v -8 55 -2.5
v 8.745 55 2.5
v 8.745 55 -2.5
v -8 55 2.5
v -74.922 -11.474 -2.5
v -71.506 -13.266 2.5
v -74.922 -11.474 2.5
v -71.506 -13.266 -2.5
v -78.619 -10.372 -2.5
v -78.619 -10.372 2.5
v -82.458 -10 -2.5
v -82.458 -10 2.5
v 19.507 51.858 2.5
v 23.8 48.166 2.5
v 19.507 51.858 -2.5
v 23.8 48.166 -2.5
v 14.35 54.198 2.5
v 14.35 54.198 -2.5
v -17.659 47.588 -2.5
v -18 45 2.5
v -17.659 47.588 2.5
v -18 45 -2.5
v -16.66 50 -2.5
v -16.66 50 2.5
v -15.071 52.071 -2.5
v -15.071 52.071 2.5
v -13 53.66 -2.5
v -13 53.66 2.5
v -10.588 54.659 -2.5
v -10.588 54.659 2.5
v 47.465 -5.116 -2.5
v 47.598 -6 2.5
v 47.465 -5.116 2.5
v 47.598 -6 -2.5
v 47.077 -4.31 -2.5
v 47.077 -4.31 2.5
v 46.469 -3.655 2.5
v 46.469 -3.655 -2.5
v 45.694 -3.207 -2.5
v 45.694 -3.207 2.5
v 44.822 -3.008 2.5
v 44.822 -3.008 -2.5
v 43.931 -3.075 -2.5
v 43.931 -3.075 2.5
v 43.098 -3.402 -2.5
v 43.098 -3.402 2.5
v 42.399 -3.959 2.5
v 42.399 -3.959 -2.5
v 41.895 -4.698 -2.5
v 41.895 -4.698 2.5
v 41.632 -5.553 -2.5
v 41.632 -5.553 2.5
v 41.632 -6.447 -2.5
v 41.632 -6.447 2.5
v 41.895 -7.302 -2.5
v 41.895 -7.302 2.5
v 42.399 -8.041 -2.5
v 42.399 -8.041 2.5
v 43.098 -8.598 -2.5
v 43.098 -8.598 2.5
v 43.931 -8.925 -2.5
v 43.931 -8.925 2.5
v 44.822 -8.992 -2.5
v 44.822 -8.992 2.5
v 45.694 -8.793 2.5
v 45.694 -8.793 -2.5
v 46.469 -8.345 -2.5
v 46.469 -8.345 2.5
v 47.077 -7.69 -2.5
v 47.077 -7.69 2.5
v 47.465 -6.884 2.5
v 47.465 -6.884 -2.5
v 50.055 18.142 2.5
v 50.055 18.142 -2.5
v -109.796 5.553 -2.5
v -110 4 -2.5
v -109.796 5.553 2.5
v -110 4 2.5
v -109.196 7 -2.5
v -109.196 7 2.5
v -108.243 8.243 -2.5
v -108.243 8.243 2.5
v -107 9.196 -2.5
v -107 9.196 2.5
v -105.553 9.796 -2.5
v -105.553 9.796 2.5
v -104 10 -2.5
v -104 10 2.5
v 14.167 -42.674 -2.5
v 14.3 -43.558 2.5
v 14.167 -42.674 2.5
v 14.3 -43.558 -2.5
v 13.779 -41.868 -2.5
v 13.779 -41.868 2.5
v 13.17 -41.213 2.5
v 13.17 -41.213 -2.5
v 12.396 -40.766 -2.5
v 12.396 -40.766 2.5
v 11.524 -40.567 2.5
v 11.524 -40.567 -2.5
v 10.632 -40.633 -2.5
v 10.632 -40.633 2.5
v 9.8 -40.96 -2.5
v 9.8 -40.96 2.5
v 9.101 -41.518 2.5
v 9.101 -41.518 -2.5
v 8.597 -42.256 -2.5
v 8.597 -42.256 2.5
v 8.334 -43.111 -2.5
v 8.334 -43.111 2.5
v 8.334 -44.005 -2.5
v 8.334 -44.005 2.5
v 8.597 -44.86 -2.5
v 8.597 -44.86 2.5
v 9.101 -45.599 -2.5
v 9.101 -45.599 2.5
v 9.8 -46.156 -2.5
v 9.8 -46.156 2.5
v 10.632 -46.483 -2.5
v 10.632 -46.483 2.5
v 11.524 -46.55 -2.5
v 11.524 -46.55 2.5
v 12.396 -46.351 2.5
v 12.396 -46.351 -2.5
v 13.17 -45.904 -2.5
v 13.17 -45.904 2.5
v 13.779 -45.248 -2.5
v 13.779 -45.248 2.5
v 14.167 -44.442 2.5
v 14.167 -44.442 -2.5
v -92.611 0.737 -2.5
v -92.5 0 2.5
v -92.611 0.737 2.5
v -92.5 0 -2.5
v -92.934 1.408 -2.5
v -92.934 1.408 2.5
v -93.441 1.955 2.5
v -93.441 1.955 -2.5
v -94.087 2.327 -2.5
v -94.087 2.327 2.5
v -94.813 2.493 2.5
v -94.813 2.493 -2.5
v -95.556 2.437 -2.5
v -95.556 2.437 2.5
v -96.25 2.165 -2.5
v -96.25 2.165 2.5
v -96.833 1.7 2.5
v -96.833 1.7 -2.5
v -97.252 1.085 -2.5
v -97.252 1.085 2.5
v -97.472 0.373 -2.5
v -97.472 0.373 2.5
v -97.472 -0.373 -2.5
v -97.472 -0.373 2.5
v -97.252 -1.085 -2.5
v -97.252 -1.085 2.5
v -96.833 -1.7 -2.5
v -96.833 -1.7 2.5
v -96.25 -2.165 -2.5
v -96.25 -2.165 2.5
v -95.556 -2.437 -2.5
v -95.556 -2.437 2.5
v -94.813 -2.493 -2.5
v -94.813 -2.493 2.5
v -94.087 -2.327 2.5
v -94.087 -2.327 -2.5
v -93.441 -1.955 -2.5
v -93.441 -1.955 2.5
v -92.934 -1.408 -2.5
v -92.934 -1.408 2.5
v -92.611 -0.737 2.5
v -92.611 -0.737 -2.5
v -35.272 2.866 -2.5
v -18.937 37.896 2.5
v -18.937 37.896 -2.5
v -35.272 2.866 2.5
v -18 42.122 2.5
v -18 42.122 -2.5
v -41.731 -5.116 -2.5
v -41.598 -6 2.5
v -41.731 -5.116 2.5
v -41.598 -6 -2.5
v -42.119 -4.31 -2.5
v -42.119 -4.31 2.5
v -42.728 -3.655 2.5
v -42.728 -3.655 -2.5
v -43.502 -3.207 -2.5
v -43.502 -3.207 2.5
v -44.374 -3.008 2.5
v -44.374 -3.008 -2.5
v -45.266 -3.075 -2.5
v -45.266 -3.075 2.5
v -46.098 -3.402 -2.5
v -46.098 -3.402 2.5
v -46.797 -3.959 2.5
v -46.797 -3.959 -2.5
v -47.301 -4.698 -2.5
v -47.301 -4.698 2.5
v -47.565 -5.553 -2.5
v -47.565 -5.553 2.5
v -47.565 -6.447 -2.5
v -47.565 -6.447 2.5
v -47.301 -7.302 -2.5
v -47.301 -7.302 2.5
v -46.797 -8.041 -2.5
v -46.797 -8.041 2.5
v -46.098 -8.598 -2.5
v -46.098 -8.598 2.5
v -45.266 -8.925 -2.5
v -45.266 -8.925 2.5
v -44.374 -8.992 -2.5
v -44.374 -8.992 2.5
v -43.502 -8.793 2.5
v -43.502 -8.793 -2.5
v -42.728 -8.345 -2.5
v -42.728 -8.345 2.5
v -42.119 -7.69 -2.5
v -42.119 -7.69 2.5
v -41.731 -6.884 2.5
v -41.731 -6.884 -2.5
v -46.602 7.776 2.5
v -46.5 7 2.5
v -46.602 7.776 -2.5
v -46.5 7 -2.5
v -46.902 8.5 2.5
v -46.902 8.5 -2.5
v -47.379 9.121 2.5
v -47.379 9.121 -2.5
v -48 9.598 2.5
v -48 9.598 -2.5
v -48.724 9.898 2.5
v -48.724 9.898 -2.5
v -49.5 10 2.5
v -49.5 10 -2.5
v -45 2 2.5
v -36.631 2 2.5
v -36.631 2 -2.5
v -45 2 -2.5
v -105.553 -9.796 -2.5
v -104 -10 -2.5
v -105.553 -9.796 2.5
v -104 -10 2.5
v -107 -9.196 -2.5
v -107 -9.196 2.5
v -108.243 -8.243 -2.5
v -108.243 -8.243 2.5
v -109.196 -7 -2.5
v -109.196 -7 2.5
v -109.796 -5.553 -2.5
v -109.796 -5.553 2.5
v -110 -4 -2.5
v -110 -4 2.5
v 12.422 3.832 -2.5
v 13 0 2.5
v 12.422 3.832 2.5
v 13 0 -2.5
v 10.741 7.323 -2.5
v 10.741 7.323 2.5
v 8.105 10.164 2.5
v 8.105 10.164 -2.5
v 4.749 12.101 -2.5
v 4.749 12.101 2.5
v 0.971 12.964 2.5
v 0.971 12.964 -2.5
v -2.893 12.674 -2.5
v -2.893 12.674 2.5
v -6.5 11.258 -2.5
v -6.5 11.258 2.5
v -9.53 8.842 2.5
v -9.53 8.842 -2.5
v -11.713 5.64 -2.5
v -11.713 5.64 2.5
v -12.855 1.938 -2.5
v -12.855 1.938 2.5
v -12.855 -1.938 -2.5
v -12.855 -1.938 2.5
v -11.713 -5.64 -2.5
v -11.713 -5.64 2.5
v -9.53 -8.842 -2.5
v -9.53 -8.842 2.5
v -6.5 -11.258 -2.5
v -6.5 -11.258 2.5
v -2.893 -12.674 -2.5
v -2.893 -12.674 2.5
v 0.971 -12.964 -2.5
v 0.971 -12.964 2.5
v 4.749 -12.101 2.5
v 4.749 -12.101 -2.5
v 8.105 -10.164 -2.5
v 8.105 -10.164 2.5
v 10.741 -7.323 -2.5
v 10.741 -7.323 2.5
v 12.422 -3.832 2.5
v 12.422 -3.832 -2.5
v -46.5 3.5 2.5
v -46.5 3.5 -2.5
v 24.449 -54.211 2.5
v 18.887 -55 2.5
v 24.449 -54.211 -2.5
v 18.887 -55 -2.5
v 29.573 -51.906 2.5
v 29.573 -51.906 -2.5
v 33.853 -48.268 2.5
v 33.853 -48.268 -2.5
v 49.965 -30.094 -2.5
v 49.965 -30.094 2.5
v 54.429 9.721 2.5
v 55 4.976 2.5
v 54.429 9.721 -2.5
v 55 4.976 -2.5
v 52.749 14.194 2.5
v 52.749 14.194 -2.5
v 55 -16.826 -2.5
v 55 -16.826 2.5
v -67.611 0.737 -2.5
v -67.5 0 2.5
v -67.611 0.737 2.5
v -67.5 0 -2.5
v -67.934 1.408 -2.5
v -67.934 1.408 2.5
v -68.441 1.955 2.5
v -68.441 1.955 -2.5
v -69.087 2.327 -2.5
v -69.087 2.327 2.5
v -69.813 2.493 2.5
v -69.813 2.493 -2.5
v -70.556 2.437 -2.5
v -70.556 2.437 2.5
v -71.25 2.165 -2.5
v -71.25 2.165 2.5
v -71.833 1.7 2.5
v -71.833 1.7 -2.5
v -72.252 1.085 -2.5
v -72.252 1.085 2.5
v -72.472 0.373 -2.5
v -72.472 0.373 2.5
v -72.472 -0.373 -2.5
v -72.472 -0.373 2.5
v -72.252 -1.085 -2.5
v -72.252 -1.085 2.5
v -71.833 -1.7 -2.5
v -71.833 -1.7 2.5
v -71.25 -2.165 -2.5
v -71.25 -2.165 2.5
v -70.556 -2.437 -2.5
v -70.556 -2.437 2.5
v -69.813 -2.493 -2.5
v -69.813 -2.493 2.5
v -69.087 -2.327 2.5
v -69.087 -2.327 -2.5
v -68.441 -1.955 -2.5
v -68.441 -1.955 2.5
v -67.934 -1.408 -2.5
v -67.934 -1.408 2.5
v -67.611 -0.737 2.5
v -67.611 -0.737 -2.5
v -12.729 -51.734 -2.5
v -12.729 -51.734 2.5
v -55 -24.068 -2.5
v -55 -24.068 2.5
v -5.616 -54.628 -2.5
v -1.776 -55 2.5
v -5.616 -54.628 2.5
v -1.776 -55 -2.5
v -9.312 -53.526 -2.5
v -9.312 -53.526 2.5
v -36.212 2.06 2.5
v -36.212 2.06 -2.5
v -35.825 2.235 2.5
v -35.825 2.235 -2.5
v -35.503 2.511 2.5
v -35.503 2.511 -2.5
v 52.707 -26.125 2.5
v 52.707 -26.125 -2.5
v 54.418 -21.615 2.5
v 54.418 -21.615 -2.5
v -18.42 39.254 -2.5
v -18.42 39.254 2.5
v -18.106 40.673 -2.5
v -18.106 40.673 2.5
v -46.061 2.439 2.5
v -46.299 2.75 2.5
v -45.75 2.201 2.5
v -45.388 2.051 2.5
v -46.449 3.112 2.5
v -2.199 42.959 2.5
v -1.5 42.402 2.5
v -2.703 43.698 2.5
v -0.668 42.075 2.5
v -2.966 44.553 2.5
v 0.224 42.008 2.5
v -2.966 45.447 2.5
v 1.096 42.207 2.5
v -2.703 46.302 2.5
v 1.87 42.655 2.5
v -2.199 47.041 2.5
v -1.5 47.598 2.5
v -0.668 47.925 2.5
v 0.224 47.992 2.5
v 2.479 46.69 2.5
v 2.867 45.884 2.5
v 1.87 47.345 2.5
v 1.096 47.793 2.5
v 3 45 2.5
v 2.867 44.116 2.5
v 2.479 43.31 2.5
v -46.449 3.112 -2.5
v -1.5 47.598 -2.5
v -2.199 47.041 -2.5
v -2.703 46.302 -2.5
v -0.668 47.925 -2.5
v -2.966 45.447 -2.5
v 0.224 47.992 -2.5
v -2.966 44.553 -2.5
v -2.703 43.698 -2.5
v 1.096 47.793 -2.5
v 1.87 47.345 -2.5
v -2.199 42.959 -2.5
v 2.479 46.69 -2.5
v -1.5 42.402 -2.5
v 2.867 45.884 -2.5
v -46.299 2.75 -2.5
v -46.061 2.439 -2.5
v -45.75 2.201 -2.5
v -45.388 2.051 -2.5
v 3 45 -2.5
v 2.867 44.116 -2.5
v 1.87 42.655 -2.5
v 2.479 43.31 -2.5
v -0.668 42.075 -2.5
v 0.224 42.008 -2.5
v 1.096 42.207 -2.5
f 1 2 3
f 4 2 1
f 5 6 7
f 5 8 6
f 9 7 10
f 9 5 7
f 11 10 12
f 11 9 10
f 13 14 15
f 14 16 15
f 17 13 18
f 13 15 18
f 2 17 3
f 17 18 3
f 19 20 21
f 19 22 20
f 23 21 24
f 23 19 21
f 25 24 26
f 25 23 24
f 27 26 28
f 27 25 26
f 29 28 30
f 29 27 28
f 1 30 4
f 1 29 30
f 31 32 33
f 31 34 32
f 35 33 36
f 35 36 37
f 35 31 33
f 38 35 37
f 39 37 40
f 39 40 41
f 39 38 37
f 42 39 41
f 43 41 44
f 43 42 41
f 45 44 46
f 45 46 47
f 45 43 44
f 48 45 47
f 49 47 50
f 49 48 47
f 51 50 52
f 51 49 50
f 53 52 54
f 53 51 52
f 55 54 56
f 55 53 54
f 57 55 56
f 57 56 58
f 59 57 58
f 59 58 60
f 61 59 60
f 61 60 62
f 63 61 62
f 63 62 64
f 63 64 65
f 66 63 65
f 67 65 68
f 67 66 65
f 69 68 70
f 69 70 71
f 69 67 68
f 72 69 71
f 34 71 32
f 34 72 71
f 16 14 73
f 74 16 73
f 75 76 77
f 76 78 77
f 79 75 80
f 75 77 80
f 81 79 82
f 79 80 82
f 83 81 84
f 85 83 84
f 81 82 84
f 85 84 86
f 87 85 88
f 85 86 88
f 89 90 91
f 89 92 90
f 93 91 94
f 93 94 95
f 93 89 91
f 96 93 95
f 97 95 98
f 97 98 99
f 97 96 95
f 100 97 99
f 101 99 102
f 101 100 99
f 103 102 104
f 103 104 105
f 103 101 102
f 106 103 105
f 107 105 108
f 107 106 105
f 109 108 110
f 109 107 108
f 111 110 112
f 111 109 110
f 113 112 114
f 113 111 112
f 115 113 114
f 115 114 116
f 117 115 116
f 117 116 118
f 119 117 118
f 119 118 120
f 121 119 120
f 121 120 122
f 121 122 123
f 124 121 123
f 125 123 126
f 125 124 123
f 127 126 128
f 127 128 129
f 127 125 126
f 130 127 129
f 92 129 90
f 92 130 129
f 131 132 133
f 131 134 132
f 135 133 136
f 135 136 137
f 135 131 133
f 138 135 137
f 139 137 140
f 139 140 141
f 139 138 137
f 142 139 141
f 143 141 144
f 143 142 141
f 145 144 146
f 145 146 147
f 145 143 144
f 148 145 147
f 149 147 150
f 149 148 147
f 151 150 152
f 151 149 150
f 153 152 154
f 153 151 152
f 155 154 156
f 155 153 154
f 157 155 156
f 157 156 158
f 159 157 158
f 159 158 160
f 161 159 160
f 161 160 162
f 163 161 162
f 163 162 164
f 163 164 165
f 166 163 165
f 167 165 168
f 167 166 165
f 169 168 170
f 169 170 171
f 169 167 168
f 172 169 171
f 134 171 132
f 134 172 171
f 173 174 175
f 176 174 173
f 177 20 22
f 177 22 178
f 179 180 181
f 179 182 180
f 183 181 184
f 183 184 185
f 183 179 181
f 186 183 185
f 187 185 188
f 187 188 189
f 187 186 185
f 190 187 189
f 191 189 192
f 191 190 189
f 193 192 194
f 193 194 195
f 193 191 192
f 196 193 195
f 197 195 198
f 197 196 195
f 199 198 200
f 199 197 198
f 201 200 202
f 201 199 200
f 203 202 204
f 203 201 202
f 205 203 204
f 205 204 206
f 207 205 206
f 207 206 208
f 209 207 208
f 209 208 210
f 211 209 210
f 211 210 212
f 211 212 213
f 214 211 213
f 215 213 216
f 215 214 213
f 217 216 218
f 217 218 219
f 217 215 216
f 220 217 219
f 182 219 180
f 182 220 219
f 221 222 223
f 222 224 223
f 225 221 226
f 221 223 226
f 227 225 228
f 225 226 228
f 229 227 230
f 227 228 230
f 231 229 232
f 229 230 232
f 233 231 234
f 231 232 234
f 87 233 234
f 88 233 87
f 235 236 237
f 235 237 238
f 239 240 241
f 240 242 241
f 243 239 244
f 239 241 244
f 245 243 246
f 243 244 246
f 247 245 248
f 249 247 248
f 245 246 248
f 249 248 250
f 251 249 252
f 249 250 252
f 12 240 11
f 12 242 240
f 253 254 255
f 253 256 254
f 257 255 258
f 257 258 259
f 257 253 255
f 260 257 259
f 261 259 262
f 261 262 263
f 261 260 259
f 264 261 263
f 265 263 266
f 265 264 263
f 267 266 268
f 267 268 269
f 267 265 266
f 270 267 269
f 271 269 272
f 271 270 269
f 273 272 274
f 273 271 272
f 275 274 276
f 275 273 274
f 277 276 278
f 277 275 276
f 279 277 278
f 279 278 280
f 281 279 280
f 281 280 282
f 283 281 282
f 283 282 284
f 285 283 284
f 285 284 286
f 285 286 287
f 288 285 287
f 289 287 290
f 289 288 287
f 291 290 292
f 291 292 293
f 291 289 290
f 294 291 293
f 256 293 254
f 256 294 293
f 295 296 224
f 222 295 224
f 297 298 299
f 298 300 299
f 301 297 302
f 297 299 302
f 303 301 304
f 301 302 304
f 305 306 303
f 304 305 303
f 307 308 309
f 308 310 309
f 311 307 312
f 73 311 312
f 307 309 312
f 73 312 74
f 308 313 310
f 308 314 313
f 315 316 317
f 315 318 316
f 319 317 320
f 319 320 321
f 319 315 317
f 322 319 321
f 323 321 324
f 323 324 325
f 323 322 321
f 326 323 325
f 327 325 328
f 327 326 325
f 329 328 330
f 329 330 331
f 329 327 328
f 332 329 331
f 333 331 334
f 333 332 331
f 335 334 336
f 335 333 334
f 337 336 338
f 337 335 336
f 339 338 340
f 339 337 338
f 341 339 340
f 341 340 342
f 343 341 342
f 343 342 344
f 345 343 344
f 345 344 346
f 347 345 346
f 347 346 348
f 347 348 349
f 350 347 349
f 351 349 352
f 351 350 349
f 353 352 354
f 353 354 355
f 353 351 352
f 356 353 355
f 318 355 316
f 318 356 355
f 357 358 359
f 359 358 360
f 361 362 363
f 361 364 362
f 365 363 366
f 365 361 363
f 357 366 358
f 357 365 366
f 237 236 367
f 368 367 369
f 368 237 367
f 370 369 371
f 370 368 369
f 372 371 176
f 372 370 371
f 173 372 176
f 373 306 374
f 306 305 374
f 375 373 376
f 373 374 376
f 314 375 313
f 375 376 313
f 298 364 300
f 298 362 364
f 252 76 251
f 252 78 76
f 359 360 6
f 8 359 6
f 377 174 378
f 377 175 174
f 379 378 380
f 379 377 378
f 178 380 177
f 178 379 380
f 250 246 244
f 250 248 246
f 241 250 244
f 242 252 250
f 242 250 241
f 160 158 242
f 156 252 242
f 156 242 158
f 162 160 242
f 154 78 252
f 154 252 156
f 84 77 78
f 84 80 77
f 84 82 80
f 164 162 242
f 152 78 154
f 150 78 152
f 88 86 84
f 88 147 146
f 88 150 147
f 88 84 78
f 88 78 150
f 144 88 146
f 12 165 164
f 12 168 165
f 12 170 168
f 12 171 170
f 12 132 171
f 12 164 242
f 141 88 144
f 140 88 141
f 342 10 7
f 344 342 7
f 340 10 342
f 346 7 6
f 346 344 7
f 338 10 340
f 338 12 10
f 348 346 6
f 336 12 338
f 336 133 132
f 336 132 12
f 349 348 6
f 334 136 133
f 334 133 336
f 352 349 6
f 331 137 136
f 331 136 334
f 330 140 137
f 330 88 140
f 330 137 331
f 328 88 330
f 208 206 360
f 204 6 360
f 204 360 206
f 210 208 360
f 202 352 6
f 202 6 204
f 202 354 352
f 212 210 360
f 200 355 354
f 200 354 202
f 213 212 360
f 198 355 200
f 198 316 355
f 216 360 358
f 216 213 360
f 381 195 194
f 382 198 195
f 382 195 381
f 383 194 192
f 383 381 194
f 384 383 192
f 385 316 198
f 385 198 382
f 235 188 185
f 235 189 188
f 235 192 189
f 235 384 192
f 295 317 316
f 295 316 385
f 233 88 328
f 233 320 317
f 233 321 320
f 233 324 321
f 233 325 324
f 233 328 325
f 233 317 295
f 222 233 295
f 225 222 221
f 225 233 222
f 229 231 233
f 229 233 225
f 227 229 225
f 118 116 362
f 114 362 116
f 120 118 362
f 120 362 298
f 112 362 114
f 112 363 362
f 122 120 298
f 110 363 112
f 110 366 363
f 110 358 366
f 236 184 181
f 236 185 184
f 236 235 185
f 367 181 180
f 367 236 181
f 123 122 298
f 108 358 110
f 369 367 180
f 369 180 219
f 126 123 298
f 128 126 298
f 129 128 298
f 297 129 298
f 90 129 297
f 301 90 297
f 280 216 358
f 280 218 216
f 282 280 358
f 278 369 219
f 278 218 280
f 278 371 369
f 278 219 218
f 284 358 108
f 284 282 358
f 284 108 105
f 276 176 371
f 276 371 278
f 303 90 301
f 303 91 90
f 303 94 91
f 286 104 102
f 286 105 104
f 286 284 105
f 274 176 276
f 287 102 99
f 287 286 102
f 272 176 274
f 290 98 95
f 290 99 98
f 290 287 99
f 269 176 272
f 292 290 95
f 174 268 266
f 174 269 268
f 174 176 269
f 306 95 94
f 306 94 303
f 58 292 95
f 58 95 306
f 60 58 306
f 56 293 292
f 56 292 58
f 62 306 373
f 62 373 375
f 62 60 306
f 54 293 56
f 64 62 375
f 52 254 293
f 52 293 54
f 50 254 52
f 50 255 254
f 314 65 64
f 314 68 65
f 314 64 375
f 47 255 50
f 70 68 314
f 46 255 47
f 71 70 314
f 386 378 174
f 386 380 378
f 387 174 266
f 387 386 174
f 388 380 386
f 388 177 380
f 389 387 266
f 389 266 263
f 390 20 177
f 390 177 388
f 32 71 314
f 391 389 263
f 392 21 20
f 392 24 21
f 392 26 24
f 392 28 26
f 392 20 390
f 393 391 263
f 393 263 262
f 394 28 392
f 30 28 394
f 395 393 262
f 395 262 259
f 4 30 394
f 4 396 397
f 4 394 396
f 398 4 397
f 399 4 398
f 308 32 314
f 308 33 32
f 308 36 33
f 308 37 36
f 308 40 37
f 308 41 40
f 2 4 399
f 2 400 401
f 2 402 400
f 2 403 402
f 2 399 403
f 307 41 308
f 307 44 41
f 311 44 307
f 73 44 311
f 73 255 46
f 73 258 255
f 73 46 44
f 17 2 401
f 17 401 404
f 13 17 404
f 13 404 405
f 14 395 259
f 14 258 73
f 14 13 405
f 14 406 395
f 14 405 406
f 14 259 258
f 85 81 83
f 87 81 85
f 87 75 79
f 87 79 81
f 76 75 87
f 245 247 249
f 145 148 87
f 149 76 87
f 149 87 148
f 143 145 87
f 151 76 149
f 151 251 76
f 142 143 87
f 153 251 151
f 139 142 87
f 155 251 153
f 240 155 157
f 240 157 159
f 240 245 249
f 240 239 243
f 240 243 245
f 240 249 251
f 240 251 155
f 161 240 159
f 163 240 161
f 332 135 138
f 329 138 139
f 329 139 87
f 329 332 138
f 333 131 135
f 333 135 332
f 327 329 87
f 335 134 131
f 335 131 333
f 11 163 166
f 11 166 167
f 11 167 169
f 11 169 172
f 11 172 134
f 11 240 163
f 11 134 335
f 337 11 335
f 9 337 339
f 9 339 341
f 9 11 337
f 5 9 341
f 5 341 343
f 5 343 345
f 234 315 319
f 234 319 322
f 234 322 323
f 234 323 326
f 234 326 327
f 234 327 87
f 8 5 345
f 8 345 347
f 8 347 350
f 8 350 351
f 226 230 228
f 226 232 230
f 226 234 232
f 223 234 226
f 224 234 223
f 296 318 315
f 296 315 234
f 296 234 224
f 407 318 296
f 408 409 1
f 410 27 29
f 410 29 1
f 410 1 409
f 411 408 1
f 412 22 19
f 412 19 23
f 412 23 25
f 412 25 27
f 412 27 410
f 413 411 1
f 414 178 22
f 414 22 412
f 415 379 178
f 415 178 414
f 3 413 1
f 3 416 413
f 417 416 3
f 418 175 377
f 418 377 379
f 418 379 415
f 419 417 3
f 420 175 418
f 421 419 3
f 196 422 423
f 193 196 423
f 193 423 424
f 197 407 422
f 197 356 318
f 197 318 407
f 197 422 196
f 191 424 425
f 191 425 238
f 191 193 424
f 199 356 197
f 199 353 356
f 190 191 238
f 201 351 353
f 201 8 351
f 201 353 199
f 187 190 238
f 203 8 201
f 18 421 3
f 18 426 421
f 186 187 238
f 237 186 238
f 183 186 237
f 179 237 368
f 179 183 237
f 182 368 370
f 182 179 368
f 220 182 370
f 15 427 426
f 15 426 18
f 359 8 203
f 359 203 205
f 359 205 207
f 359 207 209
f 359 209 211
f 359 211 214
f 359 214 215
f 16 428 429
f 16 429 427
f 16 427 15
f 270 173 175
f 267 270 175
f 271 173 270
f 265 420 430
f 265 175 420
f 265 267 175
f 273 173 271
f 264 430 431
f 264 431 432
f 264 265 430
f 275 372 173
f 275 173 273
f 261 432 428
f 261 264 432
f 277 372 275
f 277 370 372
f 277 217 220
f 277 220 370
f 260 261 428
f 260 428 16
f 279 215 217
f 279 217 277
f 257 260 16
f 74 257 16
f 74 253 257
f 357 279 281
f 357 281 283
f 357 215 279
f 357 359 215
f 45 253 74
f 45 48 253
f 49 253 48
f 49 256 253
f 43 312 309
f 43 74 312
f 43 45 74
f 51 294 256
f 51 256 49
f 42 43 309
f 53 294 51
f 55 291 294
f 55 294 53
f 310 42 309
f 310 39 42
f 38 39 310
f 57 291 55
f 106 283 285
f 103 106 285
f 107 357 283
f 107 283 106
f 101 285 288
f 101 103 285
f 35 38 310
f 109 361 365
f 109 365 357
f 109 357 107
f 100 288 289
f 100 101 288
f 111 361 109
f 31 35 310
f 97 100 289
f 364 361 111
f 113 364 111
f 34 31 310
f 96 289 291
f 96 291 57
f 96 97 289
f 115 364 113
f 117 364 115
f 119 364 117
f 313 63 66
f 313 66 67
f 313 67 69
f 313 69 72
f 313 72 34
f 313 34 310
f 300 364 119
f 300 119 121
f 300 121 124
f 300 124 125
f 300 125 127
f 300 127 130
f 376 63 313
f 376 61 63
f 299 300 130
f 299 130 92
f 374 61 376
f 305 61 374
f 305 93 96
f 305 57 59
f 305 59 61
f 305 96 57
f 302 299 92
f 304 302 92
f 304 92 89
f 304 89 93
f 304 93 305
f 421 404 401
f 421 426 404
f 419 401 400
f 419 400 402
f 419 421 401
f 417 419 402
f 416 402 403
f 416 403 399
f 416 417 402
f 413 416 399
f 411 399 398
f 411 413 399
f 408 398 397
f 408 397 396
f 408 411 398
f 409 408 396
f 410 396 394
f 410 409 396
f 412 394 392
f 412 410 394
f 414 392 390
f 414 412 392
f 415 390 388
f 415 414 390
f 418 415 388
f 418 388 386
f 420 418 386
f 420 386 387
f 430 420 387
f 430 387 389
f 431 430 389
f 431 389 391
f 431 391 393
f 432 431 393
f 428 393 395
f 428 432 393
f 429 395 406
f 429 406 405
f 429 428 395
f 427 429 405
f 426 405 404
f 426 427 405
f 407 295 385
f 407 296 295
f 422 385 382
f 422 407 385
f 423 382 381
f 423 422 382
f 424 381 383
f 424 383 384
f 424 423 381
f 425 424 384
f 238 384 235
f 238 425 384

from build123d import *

# Parameters (mm, degrees)
SKETCH1_R                       = 3
SKETCH1_R_2                     = 13
SKETCH1_R_3                     = 2.5
BOSS_EXTRUDE1_DEPTH             = 2.5
CUT_EXTRUDE1_DEPTH              = 3.5
CUT_EXTRUDE1_DEPTH_BACK         = 3.5
BOSS_EXTRUDE2_REACH             = 4.5
BOSS_EXTRUDE2_DIRECTION_2_REACH = 4.5
FILLET2_R                       = 20
FILLET4_R                       = 6
FILLET5_R                       = 10
FILLET6_R                       = 3
FILLET7_R                       = 1.5


with BuildPart() as part:
    # Sketch1 → Boss-Extrude1 (new body, symmetric)
    with BuildSketch(Plane.XY):
        Polygon((-55, 10), (-110, 10), (-110, -10), (-55, -10), (-55, -55), (55, -55), (55, 55), (-55, 55), align=None)
        with Locations((0, 45)):
            Circle(SKETCH1_R, mode=Mode.SUBTRACT)
        with Locations((-44.598206242, -6)):
            Circle(SKETCH1_R, mode=Mode.SUBTRACT)
        with Locations((44.598206242, -6)):
            Circle(SKETCH1_R, mode=Mode.SUBTRACT)
        with Locations((11.3, -43.55812209)):
            Circle(SKETCH1_R, mode=Mode.SUBTRACT)
        Circle(SKETCH1_R_2, mode=Mode.SUBTRACT)
        with Locations((-95, 0)):
            Circle(SKETCH1_R_3, mode=Mode.SUBTRACT)
        with Locations((-70, 0)):
            Circle(SKETCH1_R_3, mode=Mode.SUBTRACT)
    extrude(amount=BOSS_EXTRUDE1_DEPTH, both=True)

    # Sketch2 → Cut-Extrude1 (cut, two sides)
    with BuildSketch(Plane.XY) as cut_extrude1_sk:
        Polygon((17.823700244, 55), (55, 12.487274774), (55, 55), align=None)
        Polygon((55, -24.415324997), (27.884298804, -55), (55, -55), align=None)
        Polygon((-7.739125069, -55), (-55, -24.068320295), (-55, -55), align=None)
        Polygon((-55, 55), (-18, 55), (-18, 39.905543875), (-35.675645396, 2), (-46.5, 2), (-46.5, 10), (-55, 10), align=None)
    extrude(amount=CUT_EXTRUDE1_DEPTH, mode=Mode.SUBTRACT)
    extrude(cut_extrude1_sk.sketch, amount=-CUT_EXTRUDE1_DEPTH_BACK, mode=Mode.SUBTRACT)

    # Boss-Extrude2: up to this face of the body (flat: up to its plane)
    boss_extrude2_end = Plane(part.part.faces().sort_by_distance((-48.483053202, 6, 2.5))[0])
    # Sketch3 → Boss-Extrude2 (add, up to the picked face)
    with BuildSketch(Plane.XY, mode=Mode.PRIVATE) as boss_extrude2_sk1:
        Polygon((-55, -24.068320295), (-76.495151, -10), (-55, -10), align=None)
    boss_extrude2_tool1 = split(extrude(boss_extrude2_sk1.sketch, amount=BOSS_EXTRUDE2_REACH, mode=Mode.PRIVATE), bisect_by=boss_extrude2_end, keep=Keep.BOTH, mode=Mode.PRIVATE)
    add(boss_extrude2_tool1.solids().sort_by_distance((-62.16505, -14.68944, 0))[0])

    # Boss-Extrude2 direction 2: up to this face of the body (flat: up to its plane)
    boss_extrude2_direction_2_end = Plane(part.part.faces().sort_by_distance((-78.25, 8.016946798, -2.5))[0])
    # Sketch3 → Boss-Extrude2 direction 2 (add, up to the picked face)
    with BuildSketch(Plane.XY, mode=Mode.PRIVATE) as boss_extrude2_direction_2_sk1:
        Polygon((-55, -24.068320295), (-76.495151, -10), (-55, -10), align=None)
    boss_extrude2_direction_2_tool1 = split(extrude(boss_extrude2_direction_2_sk1.sketch, amount=-BOSS_EXTRUDE2_DIRECTION_2_REACH, mode=Mode.PRIVATE), bisect_by=boss_extrude2_direction_2_end, keep=Keep.BOTH, mode=Mode.PRIVATE)
    add(boss_extrude2_direction_2_tool1.solids().sort_by_distance((-62.16505, -14.68944, 0))[0])

    # Fillet2
    fillet2_edges = [part.edges().sort_by_distance(p)[0] for p in [
        (-76.495151, -10, 0),
        (-7.739125069, -55, 0),
        (55, -24.415324997, 0),
        (27.884298804, -55, 0),
        (17.823700244, 55, 0),
        (55, 12.487274774, 0),
    ]]
    fillet(fillet2_edges, radius=FILLET2_R)

    # Fillet4
    fillet4_edges = [part.edges().sort_by_distance(p)[0] for p in [
        (-110, -10, 0),
        (-110, 10, 0),
    ]]
    fillet(fillet4_edges, radius=FILLET4_R)

    # Fillet5
    fillet5_edges = [part.edges().sort_by_distance(p)[0] for p in [
        (-18, 55, 0),
        (-18, 39.905543875, 0),
    ]]
    fillet(fillet5_edges, radius=FILLET5_R)

    # Fillet6
    fillet6_edges = [part.edges().sort_by_distance(p)[0] for p in [
        (-46.5, 10, 0),
    ]]
    fillet(fillet6_edges, radius=FILLET6_R)

    # Fillet7
    fillet7_edges = [part.edges().sort_by_distance(p)[0] for p in [
        (-35.675645396, 2, 0),
        (-46.5, 2, 0),
    ]]
    fillet(fillet7_edges, radius=FILLET7_R)


solid = part.part
